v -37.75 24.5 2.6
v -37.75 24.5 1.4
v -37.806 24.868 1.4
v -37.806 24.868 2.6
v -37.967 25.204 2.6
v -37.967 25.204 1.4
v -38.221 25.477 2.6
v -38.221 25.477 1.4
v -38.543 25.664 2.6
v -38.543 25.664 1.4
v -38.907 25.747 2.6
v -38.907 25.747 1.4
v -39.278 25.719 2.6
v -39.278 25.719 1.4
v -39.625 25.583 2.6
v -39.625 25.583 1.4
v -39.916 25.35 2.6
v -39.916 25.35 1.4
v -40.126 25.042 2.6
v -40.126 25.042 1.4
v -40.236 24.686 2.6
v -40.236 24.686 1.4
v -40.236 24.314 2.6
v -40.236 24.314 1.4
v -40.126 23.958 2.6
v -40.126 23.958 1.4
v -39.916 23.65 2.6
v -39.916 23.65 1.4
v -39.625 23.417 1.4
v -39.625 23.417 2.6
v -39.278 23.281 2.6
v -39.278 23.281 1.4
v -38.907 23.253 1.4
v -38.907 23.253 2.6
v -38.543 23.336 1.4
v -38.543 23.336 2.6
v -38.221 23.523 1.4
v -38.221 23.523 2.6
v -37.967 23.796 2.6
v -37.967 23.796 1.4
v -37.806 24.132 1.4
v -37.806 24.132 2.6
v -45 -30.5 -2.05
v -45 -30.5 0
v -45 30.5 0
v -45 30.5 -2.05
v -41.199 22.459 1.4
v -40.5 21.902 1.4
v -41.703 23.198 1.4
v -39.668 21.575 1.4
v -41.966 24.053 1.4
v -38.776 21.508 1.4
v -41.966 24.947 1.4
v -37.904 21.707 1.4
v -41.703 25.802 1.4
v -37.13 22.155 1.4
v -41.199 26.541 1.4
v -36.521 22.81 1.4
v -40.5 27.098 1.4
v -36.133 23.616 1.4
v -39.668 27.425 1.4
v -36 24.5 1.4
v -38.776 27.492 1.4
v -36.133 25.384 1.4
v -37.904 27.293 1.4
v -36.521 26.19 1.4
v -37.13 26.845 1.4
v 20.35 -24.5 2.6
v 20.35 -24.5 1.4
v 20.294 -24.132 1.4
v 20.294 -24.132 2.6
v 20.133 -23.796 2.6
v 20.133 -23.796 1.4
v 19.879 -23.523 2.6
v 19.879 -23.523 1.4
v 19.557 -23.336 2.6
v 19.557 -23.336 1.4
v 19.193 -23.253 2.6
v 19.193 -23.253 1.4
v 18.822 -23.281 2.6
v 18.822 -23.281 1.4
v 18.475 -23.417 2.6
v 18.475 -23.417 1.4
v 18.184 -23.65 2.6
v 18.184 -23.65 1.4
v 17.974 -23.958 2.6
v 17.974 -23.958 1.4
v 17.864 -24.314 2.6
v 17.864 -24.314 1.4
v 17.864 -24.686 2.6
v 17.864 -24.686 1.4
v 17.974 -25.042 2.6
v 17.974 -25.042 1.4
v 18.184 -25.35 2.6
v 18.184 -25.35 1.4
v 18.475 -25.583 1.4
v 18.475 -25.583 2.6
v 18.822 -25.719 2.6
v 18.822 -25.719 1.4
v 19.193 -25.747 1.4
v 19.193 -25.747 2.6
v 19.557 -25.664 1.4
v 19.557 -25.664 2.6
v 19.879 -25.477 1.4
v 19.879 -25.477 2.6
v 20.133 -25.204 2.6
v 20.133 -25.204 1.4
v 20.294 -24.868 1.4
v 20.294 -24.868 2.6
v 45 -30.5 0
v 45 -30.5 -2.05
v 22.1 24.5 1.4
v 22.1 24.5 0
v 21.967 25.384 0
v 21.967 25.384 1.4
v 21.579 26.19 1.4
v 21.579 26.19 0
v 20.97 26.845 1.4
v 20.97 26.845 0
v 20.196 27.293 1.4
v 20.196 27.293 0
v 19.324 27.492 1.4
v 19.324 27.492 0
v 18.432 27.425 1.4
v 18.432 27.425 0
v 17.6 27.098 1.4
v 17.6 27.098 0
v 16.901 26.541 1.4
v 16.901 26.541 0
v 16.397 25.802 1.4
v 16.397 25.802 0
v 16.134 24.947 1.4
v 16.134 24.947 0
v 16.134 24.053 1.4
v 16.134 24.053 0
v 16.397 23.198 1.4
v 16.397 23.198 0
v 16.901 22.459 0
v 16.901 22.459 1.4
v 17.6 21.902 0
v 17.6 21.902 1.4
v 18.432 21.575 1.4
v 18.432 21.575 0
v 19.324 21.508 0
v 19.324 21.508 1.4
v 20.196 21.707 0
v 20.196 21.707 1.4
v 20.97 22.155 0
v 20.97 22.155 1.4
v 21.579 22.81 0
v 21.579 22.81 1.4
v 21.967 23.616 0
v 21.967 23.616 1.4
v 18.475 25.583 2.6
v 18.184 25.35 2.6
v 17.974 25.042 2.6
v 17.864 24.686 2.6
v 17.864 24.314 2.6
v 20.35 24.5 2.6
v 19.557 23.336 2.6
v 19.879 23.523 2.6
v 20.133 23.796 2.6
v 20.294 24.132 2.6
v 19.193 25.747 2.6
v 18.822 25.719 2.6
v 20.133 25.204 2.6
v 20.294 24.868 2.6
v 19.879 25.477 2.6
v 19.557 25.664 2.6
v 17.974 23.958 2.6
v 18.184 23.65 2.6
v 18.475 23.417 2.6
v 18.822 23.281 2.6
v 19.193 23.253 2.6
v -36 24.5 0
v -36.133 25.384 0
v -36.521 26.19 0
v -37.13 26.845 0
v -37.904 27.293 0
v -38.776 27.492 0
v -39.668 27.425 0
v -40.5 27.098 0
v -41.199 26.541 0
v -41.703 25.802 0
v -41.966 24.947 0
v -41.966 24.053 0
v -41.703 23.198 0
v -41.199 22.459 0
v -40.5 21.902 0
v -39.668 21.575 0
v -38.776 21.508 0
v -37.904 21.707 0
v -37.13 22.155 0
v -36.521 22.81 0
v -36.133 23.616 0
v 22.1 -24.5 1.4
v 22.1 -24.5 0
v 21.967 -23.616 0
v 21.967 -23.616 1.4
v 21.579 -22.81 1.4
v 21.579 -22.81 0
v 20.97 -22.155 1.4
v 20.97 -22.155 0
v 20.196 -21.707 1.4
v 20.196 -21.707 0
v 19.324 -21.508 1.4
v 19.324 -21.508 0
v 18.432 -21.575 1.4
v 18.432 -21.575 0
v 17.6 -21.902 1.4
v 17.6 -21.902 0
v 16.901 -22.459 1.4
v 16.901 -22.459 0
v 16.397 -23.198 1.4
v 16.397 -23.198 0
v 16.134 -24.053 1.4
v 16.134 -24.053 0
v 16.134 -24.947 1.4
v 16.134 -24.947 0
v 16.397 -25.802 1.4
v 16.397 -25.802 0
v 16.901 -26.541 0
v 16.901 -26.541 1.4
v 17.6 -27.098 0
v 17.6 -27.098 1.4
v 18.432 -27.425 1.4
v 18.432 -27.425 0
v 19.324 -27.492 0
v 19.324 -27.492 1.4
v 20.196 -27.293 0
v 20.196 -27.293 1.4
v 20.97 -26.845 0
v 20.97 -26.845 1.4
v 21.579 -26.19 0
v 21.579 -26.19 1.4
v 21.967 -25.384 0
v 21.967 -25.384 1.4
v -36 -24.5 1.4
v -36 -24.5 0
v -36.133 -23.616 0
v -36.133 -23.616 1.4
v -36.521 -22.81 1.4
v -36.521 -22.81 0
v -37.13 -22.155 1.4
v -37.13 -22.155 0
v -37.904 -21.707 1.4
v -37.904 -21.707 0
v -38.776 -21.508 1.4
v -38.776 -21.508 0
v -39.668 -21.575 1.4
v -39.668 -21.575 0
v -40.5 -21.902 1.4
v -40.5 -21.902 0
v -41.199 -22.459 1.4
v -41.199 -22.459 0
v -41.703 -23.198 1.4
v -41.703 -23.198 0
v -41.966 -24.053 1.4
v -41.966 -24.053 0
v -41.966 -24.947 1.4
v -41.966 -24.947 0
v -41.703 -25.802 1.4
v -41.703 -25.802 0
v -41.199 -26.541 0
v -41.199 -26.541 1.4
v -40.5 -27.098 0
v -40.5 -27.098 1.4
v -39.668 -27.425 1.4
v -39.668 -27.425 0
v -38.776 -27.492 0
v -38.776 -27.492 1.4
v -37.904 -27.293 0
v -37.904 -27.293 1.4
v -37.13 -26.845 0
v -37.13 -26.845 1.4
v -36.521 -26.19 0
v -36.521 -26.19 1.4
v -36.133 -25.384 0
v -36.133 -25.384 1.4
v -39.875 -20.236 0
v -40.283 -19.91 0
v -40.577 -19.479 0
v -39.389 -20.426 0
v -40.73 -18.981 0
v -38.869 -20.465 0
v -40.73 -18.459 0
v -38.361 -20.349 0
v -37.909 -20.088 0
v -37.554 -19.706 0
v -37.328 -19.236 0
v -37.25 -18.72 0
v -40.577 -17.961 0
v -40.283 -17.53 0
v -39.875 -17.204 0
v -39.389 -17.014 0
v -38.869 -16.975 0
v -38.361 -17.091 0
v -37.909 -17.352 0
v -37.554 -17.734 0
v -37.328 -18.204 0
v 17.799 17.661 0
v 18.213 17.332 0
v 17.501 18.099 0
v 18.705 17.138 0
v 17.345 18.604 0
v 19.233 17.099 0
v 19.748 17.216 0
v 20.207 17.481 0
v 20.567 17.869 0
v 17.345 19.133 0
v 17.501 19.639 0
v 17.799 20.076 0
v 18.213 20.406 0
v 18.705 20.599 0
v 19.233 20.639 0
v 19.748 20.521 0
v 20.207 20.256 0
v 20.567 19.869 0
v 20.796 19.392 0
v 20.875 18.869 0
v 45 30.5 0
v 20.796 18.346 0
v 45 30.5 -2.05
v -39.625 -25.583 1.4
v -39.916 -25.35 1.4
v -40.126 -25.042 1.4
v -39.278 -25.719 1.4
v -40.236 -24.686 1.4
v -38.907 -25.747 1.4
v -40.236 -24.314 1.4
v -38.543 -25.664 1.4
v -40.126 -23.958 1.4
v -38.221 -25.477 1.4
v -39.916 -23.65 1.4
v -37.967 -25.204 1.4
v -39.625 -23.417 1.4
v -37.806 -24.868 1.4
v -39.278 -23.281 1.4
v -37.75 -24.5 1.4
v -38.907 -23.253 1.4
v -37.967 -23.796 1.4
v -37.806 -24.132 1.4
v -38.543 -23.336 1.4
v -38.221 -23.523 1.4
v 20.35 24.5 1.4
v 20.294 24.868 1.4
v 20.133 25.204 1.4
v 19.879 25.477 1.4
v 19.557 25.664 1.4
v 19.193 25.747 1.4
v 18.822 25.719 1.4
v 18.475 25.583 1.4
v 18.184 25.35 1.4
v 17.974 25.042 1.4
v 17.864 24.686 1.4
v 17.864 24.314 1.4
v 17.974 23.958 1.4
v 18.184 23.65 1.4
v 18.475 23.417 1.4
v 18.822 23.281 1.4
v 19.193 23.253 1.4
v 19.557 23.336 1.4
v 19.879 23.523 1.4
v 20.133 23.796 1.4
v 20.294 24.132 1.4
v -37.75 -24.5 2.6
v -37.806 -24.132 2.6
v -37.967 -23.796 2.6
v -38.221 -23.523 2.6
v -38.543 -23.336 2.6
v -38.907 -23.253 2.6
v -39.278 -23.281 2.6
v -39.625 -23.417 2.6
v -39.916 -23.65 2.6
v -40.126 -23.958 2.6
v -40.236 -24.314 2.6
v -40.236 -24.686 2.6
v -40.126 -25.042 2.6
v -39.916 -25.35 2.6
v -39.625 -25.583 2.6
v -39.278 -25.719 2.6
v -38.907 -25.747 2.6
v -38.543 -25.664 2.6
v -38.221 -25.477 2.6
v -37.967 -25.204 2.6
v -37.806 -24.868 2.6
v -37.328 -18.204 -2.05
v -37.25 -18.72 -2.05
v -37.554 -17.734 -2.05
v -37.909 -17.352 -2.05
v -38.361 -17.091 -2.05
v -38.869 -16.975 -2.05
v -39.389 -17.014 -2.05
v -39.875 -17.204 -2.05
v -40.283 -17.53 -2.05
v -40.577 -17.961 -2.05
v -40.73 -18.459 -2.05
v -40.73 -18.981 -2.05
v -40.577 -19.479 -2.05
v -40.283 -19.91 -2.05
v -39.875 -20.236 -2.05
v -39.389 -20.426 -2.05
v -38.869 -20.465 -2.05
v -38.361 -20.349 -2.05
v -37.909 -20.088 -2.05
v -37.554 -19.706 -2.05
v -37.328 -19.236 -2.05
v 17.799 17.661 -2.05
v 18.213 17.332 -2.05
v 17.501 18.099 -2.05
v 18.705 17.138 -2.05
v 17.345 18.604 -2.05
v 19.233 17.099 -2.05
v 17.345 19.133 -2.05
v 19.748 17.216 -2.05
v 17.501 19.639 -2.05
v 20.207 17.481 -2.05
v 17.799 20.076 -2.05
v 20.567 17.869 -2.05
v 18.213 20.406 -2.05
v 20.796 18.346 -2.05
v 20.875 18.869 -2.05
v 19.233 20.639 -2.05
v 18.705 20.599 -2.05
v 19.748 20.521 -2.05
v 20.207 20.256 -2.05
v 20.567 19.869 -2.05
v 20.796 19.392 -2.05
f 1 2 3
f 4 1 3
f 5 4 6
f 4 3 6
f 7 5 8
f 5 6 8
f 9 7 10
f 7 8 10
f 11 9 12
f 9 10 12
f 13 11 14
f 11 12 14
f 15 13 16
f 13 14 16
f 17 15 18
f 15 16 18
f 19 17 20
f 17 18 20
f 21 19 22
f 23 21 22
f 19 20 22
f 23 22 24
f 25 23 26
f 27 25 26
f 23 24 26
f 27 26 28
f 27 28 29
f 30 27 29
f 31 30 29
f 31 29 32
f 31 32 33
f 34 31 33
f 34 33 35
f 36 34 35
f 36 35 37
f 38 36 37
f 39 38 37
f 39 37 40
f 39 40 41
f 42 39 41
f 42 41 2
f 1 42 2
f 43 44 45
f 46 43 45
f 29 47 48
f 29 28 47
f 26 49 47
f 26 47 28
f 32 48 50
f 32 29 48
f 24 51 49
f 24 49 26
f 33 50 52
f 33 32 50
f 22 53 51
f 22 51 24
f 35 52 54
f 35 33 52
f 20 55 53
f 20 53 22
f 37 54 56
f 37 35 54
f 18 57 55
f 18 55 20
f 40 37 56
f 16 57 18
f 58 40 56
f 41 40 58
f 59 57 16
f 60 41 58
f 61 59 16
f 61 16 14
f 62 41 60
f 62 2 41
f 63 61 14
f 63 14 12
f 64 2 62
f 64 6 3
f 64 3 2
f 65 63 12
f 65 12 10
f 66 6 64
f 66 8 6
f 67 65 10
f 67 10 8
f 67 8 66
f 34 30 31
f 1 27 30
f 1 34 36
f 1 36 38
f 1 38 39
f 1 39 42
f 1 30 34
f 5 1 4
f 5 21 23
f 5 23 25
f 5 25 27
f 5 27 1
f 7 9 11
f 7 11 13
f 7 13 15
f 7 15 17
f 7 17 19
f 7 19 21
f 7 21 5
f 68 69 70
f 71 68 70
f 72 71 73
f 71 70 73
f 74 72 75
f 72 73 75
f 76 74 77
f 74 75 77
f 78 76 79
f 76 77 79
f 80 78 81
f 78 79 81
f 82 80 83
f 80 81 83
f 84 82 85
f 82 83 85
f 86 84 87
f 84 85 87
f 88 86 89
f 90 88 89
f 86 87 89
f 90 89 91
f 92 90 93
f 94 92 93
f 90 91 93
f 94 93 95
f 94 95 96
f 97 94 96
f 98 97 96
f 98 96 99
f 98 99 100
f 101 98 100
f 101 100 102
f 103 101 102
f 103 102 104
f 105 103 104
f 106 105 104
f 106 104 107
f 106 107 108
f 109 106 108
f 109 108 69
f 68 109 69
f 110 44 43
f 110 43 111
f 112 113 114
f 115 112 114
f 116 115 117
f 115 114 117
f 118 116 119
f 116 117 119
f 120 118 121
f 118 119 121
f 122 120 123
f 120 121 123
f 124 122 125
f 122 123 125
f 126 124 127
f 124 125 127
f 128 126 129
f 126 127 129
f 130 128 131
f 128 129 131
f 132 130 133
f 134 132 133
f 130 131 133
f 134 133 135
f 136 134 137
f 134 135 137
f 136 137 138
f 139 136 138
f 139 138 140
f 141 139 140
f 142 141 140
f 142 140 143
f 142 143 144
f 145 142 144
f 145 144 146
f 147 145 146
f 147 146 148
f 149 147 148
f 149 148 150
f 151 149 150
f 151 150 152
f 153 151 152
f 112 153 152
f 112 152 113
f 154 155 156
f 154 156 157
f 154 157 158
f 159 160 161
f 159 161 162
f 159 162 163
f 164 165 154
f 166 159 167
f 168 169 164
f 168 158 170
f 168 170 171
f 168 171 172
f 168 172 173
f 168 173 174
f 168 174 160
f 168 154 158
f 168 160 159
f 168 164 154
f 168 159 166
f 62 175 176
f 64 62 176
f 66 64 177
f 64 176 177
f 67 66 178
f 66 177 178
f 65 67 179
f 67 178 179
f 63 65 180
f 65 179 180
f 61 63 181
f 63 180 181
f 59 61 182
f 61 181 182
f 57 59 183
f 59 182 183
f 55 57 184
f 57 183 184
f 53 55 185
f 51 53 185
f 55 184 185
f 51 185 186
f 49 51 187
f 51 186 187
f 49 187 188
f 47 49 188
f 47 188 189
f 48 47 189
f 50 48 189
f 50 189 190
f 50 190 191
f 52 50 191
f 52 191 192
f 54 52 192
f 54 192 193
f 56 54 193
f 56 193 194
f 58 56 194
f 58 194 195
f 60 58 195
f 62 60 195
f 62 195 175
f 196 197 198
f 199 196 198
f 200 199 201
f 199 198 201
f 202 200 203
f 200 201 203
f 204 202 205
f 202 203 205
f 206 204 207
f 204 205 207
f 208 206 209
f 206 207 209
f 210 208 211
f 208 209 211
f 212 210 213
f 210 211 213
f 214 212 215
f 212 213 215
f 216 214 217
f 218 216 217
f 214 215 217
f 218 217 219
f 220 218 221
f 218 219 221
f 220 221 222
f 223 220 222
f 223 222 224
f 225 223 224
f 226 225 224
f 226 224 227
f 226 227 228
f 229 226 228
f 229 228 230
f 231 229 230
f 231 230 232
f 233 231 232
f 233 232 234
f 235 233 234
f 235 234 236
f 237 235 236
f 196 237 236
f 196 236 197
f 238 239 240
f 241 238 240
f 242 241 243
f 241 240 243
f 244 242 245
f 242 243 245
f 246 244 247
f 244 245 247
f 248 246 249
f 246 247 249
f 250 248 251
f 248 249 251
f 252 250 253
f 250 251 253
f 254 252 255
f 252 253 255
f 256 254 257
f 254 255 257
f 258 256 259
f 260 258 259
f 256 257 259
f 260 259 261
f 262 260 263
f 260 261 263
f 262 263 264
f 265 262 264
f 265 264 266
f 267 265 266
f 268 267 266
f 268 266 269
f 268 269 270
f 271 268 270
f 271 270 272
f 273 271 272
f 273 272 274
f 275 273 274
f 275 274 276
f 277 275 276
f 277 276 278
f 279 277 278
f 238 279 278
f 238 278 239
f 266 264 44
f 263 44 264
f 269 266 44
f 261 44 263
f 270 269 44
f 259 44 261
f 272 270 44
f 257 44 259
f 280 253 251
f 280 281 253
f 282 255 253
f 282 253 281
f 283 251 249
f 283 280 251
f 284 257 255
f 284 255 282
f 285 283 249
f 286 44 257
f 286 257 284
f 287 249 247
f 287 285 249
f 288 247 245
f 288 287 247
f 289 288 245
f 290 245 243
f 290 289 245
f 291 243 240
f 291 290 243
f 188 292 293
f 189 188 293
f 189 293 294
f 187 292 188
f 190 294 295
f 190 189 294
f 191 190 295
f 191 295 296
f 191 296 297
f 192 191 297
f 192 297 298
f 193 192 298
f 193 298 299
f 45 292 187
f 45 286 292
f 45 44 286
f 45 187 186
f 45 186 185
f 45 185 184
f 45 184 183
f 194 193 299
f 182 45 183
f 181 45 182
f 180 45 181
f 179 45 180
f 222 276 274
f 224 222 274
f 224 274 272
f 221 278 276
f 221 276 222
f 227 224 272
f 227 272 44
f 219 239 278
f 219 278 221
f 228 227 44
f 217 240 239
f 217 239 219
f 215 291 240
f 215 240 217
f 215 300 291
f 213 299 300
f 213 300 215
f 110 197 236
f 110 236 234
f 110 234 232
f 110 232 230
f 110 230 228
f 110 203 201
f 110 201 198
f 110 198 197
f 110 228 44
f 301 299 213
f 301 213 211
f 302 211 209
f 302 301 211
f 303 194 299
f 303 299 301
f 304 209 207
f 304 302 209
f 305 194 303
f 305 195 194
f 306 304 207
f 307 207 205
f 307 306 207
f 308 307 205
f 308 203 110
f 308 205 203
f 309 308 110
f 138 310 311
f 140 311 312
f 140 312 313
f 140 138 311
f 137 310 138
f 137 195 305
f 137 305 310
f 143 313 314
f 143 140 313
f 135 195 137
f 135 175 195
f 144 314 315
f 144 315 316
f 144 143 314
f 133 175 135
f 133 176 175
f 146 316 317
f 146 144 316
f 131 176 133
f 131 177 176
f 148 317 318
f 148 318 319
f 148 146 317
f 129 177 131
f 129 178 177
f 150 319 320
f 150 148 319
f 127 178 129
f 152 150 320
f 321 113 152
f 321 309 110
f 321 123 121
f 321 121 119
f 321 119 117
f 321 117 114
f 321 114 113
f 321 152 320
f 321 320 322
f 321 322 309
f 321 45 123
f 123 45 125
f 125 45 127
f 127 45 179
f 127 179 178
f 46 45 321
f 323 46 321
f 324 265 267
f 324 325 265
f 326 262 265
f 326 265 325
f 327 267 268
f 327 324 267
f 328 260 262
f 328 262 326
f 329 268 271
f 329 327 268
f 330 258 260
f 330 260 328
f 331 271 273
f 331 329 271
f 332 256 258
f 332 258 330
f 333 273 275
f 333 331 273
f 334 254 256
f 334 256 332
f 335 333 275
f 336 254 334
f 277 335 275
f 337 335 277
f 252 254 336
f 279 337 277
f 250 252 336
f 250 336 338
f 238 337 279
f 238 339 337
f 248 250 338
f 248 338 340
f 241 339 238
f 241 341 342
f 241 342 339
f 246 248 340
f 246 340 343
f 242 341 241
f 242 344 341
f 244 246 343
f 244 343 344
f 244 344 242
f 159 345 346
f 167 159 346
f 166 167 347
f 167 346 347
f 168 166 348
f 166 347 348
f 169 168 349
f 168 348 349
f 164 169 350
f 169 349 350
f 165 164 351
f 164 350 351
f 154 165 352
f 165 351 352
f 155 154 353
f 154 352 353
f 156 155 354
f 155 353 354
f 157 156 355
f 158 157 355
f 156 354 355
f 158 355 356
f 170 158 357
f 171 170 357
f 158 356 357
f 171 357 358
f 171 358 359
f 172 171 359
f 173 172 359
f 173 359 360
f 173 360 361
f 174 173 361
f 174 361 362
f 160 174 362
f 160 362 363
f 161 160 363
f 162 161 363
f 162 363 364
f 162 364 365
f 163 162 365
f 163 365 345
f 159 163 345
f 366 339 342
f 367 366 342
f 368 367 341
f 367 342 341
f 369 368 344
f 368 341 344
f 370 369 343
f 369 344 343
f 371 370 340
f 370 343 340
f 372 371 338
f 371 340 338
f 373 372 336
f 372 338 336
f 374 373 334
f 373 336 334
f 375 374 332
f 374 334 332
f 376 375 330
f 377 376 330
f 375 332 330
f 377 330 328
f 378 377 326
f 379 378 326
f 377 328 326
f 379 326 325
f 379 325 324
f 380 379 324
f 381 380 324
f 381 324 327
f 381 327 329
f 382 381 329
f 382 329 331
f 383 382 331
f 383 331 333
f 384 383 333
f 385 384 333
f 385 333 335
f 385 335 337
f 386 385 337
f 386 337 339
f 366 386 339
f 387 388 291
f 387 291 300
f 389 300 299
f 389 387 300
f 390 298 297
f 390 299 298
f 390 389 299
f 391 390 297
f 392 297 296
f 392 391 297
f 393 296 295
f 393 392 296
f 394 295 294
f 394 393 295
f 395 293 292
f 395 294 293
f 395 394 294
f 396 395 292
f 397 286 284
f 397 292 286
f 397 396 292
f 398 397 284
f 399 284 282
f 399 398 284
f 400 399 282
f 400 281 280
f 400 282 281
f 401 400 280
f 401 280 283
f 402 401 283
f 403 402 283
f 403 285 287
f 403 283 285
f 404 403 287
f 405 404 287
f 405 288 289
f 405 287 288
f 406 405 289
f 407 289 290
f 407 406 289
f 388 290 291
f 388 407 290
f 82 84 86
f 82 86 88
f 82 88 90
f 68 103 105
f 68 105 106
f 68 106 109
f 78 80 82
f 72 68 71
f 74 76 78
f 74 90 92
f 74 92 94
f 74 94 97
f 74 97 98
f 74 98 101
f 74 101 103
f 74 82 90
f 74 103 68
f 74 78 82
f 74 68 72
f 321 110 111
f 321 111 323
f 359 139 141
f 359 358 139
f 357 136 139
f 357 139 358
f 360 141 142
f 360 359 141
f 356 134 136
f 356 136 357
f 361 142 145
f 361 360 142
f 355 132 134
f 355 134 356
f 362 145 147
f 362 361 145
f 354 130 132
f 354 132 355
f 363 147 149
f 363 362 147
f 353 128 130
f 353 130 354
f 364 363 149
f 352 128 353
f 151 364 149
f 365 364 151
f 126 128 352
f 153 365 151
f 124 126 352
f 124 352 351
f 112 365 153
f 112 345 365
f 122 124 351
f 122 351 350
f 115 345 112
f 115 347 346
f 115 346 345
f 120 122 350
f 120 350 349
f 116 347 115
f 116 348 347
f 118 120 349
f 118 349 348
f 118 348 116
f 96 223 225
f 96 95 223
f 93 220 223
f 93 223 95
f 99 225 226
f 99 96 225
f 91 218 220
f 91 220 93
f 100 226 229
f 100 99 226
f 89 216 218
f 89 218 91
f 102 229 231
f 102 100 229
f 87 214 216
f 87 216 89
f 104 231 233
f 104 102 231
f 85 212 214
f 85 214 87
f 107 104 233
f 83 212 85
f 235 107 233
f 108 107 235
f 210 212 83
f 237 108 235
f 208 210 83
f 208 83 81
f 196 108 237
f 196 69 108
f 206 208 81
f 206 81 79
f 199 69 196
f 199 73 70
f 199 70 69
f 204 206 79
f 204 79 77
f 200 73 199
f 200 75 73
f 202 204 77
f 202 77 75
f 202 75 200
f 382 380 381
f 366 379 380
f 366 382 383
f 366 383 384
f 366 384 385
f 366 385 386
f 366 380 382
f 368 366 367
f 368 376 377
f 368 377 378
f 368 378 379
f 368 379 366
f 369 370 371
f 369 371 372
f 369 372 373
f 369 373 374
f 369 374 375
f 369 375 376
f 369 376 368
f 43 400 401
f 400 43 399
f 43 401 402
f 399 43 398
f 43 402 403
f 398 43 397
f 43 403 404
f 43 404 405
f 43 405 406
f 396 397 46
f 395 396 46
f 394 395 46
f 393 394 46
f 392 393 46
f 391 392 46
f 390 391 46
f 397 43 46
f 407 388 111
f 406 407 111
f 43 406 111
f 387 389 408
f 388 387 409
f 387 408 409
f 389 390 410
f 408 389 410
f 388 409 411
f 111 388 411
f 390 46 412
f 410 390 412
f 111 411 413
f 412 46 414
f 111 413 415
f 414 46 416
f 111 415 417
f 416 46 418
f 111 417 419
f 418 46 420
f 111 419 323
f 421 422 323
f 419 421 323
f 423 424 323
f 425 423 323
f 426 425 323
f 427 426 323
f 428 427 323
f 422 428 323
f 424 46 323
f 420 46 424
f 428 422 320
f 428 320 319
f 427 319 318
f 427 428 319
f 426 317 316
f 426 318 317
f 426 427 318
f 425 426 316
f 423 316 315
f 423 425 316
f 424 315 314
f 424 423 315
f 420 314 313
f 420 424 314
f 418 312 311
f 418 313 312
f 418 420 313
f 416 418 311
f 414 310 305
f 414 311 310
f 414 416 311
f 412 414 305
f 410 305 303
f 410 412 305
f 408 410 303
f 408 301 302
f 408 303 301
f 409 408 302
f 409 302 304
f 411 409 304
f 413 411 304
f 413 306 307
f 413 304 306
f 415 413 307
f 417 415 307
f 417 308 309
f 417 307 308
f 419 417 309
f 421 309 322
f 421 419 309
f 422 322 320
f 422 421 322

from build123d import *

# Parameters (mm, degrees)
BASE_W                       = 90
BASE_H                       = 61
BASE_BLOCK_DEPTH             = 2.05
OUTER_PIN_STAND_DEPTH        = 1.4
OUTER_PIN_STAND_DEPTH_BACK   = 0.5
OUTER_PIN_R                  = 3
OUTER_PIN_STAND_2_DEPTH      = 1.4
OUTER_PIN_STAND_2_DEPTH_BACK = 0.5
OUTER_PIN_STAND_3_DEPTH      = 1.4
OUTER_PIN_STAND_3_DEPTH_BACK = 0.5
OUTER_PIN_STAND_4_DEPTH      = 1.4
OUTER_PIN_STAND_4_DEPTH_BACK = 0.5
INNER_PIN_STAND_DEPTH        = 2.6
INNER_PIN_STAND_DEPTH_BACK   = 0.5
SKETCH3_R                    = 1.25
INNER_PIN_STAND_2_DEPTH      = 2.6
INNER_PIN_STAND_2_DEPTH_BACK = 0.5
INNER_PIN_STAND_3_DEPTH      = 2.6
INNER_PIN_STAND_3_DEPTH_BACK = 0.5
INNER_PIN_STAND_4_DEPTH      = 2.6
INNER_PIN_STAND_4_DEPTH_BACK = 0.5
HOLES_DEPTH                  = 5
HOLES_DEPTH_BACK             = 5
SKETCH5_R                    = 1.75
HOLES_2_DEPTH                = 5
HOLES_2_DEPTH_BACK           = 5
SKETCH5_R_2                  = 1.775


with BuildPart() as part:
    # Base → Base Block (new body)
    with BuildSketch(Plane.XY):
        Rectangle(BASE_W, BASE_H)
    extrude(amount=-BASE_BLOCK_DEPTH)


with BuildPart() as body_2:
    # Outer Pin → Outer Pin Stand (new, two sides: drawn at the far end of the back side and taken through both)
    with BuildSketch(Plane.XY.offset(-OUTER_PIN_STAND_DEPTH_BACK)):
        with Locations((-39, 24.5)):
            Circle(OUTER_PIN_R)
    extrude(amount=OUTER_PIN_STAND_DEPTH + OUTER_PIN_STAND_DEPTH_BACK)


with BuildPart() as body_3:
    # Outer Pin → Outer Pin Stand 2 (new, two sides: drawn at the far end of the back side and taken through both)
    with BuildSketch(Plane.XY.offset(-OUTER_PIN_STAND_2_DEPTH_BACK)):
        with Locations((-39, -24.5)):
            Circle(OUTER_PIN_R)
    extrude(amount=OUTER_PIN_STAND_2_DEPTH + OUTER_PIN_STAND_2_DEPTH_BACK)


with BuildPart() as body_4:
    # Outer Pin → Outer Pin Stand 3 (new, two sides: drawn at the far end of the back side and taken through both)
    with BuildSketch(Plane.XY.offset(-OUTER_PIN_STAND_3_DEPTH_BACK)):
        with Locations((19.1, -24.5)):
            Circle(OUTER_PIN_R)
    extrude(amount=OUTER_PIN_STAND_3_DEPTH + OUTER_PIN_STAND_3_DEPTH_BACK)


with BuildPart() as body_5:
    # Outer Pin → Outer Pin Stand 4 (new, two sides: drawn at the far end of the back side and taken through both)
    with BuildSketch(Plane.XY.offset(-OUTER_PIN_STAND_4_DEPTH_BACK)):
        with Locations((19.1, 24.5)):
            Circle(OUTER_PIN_R)
    extrude(amount=OUTER_PIN_STAND_4_DEPTH + OUTER_PIN_STAND_4_DEPTH_BACK)


with BuildPart() as body_6:
    # Sketch3 → Inner Pin Stand (new, two sides: drawn at the far end of the back side and taken through both)
    with BuildSketch(Plane.XY.offset(-INNER_PIN_STAND_DEPTH_BACK)):
        with Locations((-39, 24.5)):
            Circle(SKETCH3_R)
    extrude(amount=INNER_PIN_STAND_DEPTH + INNER_PIN_STAND_DEPTH_BACK)


with BuildPart() as body_7:
    # Sketch3 → Inner Pin Stand 2 (new, two sides: drawn at the far end of the back side and taken through both)
    with BuildSketch(Plane.XY.offset(-INNER_PIN_STAND_2_DEPTH_BACK)):
        with Locations((19.1, 24.5)):
            Circle(SKETCH3_R)
    extrude(amount=INNER_PIN_STAND_2_DEPTH + INNER_PIN_STAND_2_DEPTH_BACK)


with BuildPart() as body_8:
    # Sketch3 → Inner Pin Stand 3 (new, two sides: drawn at the far end of the back side and taken through both)
    with BuildSketch(Plane.XY.offset(-INNER_PIN_STAND_3_DEPTH_BACK)):
        with Locations((19.1, -24.5)):
            Circle(SKETCH3_R)
    extrude(amount=INNER_PIN_STAND_3_DEPTH + INNER_PIN_STAND_3_DEPTH_BACK)


with BuildPart() as body_9:
    # Sketch3 → Inner Pin Stand 4 (new, two sides: drawn at the far end of the back side and taken through both)
    with BuildSketch(Plane.XY.offset(-INNER_PIN_STAND_4_DEPTH_BACK)):
        with Locations((-39, -24.5)):
            Circle(SKETCH3_R)
    extrude(amount=INNER_PIN_STAND_4_DEPTH + INNER_PIN_STAND_4_DEPTH_BACK)


with BuildPart() as body_10:
    # Sketch5 → Holes (new, two sides: drawn at the far end of the back side and taken through both)
    with BuildSketch(Plane.XY.offset(-HOLES_DEPTH_BACK)):
        with Locations((-39, -18.72)):
            Circle(SKETCH5_R)
    extrude(amount=HOLES_DEPTH + HOLES_DEPTH_BACK)


with BuildPart() as body_11:
    # Sketch5 → Holes 2 (new, two sides: drawn at the far end of the back side and taken through both)
    with BuildSketch(Plane.XY.offset(-HOLES_2_DEPTH_BACK)):
        with Locations((19.1, 18.86871886)):
            Circle(SKETCH5_R_2)
    extrude(amount=HOLES_2_DEPTH + HOLES_2_DEPTH_BACK)


with BuildPart() as part_1:
    add(part.part)

    # Combine1: union body 2, body 6, body 5, body 7, body 4, body 8, body 3, body 9
    add(body_2.part)
    add(body_6.part)
    add(body_5.part)
    add(body_7.part)
    add(body_4.part)
    add(body_8.part)
    add(body_3.part)
    add(body_9.part)

    # Combine2: cut body 11, body 10
    add(body_11.part, mode=Mode.SUBTRACT)
    add(body_10.part, mode=Mode.SUBTRACT)


solid = part_1.part
